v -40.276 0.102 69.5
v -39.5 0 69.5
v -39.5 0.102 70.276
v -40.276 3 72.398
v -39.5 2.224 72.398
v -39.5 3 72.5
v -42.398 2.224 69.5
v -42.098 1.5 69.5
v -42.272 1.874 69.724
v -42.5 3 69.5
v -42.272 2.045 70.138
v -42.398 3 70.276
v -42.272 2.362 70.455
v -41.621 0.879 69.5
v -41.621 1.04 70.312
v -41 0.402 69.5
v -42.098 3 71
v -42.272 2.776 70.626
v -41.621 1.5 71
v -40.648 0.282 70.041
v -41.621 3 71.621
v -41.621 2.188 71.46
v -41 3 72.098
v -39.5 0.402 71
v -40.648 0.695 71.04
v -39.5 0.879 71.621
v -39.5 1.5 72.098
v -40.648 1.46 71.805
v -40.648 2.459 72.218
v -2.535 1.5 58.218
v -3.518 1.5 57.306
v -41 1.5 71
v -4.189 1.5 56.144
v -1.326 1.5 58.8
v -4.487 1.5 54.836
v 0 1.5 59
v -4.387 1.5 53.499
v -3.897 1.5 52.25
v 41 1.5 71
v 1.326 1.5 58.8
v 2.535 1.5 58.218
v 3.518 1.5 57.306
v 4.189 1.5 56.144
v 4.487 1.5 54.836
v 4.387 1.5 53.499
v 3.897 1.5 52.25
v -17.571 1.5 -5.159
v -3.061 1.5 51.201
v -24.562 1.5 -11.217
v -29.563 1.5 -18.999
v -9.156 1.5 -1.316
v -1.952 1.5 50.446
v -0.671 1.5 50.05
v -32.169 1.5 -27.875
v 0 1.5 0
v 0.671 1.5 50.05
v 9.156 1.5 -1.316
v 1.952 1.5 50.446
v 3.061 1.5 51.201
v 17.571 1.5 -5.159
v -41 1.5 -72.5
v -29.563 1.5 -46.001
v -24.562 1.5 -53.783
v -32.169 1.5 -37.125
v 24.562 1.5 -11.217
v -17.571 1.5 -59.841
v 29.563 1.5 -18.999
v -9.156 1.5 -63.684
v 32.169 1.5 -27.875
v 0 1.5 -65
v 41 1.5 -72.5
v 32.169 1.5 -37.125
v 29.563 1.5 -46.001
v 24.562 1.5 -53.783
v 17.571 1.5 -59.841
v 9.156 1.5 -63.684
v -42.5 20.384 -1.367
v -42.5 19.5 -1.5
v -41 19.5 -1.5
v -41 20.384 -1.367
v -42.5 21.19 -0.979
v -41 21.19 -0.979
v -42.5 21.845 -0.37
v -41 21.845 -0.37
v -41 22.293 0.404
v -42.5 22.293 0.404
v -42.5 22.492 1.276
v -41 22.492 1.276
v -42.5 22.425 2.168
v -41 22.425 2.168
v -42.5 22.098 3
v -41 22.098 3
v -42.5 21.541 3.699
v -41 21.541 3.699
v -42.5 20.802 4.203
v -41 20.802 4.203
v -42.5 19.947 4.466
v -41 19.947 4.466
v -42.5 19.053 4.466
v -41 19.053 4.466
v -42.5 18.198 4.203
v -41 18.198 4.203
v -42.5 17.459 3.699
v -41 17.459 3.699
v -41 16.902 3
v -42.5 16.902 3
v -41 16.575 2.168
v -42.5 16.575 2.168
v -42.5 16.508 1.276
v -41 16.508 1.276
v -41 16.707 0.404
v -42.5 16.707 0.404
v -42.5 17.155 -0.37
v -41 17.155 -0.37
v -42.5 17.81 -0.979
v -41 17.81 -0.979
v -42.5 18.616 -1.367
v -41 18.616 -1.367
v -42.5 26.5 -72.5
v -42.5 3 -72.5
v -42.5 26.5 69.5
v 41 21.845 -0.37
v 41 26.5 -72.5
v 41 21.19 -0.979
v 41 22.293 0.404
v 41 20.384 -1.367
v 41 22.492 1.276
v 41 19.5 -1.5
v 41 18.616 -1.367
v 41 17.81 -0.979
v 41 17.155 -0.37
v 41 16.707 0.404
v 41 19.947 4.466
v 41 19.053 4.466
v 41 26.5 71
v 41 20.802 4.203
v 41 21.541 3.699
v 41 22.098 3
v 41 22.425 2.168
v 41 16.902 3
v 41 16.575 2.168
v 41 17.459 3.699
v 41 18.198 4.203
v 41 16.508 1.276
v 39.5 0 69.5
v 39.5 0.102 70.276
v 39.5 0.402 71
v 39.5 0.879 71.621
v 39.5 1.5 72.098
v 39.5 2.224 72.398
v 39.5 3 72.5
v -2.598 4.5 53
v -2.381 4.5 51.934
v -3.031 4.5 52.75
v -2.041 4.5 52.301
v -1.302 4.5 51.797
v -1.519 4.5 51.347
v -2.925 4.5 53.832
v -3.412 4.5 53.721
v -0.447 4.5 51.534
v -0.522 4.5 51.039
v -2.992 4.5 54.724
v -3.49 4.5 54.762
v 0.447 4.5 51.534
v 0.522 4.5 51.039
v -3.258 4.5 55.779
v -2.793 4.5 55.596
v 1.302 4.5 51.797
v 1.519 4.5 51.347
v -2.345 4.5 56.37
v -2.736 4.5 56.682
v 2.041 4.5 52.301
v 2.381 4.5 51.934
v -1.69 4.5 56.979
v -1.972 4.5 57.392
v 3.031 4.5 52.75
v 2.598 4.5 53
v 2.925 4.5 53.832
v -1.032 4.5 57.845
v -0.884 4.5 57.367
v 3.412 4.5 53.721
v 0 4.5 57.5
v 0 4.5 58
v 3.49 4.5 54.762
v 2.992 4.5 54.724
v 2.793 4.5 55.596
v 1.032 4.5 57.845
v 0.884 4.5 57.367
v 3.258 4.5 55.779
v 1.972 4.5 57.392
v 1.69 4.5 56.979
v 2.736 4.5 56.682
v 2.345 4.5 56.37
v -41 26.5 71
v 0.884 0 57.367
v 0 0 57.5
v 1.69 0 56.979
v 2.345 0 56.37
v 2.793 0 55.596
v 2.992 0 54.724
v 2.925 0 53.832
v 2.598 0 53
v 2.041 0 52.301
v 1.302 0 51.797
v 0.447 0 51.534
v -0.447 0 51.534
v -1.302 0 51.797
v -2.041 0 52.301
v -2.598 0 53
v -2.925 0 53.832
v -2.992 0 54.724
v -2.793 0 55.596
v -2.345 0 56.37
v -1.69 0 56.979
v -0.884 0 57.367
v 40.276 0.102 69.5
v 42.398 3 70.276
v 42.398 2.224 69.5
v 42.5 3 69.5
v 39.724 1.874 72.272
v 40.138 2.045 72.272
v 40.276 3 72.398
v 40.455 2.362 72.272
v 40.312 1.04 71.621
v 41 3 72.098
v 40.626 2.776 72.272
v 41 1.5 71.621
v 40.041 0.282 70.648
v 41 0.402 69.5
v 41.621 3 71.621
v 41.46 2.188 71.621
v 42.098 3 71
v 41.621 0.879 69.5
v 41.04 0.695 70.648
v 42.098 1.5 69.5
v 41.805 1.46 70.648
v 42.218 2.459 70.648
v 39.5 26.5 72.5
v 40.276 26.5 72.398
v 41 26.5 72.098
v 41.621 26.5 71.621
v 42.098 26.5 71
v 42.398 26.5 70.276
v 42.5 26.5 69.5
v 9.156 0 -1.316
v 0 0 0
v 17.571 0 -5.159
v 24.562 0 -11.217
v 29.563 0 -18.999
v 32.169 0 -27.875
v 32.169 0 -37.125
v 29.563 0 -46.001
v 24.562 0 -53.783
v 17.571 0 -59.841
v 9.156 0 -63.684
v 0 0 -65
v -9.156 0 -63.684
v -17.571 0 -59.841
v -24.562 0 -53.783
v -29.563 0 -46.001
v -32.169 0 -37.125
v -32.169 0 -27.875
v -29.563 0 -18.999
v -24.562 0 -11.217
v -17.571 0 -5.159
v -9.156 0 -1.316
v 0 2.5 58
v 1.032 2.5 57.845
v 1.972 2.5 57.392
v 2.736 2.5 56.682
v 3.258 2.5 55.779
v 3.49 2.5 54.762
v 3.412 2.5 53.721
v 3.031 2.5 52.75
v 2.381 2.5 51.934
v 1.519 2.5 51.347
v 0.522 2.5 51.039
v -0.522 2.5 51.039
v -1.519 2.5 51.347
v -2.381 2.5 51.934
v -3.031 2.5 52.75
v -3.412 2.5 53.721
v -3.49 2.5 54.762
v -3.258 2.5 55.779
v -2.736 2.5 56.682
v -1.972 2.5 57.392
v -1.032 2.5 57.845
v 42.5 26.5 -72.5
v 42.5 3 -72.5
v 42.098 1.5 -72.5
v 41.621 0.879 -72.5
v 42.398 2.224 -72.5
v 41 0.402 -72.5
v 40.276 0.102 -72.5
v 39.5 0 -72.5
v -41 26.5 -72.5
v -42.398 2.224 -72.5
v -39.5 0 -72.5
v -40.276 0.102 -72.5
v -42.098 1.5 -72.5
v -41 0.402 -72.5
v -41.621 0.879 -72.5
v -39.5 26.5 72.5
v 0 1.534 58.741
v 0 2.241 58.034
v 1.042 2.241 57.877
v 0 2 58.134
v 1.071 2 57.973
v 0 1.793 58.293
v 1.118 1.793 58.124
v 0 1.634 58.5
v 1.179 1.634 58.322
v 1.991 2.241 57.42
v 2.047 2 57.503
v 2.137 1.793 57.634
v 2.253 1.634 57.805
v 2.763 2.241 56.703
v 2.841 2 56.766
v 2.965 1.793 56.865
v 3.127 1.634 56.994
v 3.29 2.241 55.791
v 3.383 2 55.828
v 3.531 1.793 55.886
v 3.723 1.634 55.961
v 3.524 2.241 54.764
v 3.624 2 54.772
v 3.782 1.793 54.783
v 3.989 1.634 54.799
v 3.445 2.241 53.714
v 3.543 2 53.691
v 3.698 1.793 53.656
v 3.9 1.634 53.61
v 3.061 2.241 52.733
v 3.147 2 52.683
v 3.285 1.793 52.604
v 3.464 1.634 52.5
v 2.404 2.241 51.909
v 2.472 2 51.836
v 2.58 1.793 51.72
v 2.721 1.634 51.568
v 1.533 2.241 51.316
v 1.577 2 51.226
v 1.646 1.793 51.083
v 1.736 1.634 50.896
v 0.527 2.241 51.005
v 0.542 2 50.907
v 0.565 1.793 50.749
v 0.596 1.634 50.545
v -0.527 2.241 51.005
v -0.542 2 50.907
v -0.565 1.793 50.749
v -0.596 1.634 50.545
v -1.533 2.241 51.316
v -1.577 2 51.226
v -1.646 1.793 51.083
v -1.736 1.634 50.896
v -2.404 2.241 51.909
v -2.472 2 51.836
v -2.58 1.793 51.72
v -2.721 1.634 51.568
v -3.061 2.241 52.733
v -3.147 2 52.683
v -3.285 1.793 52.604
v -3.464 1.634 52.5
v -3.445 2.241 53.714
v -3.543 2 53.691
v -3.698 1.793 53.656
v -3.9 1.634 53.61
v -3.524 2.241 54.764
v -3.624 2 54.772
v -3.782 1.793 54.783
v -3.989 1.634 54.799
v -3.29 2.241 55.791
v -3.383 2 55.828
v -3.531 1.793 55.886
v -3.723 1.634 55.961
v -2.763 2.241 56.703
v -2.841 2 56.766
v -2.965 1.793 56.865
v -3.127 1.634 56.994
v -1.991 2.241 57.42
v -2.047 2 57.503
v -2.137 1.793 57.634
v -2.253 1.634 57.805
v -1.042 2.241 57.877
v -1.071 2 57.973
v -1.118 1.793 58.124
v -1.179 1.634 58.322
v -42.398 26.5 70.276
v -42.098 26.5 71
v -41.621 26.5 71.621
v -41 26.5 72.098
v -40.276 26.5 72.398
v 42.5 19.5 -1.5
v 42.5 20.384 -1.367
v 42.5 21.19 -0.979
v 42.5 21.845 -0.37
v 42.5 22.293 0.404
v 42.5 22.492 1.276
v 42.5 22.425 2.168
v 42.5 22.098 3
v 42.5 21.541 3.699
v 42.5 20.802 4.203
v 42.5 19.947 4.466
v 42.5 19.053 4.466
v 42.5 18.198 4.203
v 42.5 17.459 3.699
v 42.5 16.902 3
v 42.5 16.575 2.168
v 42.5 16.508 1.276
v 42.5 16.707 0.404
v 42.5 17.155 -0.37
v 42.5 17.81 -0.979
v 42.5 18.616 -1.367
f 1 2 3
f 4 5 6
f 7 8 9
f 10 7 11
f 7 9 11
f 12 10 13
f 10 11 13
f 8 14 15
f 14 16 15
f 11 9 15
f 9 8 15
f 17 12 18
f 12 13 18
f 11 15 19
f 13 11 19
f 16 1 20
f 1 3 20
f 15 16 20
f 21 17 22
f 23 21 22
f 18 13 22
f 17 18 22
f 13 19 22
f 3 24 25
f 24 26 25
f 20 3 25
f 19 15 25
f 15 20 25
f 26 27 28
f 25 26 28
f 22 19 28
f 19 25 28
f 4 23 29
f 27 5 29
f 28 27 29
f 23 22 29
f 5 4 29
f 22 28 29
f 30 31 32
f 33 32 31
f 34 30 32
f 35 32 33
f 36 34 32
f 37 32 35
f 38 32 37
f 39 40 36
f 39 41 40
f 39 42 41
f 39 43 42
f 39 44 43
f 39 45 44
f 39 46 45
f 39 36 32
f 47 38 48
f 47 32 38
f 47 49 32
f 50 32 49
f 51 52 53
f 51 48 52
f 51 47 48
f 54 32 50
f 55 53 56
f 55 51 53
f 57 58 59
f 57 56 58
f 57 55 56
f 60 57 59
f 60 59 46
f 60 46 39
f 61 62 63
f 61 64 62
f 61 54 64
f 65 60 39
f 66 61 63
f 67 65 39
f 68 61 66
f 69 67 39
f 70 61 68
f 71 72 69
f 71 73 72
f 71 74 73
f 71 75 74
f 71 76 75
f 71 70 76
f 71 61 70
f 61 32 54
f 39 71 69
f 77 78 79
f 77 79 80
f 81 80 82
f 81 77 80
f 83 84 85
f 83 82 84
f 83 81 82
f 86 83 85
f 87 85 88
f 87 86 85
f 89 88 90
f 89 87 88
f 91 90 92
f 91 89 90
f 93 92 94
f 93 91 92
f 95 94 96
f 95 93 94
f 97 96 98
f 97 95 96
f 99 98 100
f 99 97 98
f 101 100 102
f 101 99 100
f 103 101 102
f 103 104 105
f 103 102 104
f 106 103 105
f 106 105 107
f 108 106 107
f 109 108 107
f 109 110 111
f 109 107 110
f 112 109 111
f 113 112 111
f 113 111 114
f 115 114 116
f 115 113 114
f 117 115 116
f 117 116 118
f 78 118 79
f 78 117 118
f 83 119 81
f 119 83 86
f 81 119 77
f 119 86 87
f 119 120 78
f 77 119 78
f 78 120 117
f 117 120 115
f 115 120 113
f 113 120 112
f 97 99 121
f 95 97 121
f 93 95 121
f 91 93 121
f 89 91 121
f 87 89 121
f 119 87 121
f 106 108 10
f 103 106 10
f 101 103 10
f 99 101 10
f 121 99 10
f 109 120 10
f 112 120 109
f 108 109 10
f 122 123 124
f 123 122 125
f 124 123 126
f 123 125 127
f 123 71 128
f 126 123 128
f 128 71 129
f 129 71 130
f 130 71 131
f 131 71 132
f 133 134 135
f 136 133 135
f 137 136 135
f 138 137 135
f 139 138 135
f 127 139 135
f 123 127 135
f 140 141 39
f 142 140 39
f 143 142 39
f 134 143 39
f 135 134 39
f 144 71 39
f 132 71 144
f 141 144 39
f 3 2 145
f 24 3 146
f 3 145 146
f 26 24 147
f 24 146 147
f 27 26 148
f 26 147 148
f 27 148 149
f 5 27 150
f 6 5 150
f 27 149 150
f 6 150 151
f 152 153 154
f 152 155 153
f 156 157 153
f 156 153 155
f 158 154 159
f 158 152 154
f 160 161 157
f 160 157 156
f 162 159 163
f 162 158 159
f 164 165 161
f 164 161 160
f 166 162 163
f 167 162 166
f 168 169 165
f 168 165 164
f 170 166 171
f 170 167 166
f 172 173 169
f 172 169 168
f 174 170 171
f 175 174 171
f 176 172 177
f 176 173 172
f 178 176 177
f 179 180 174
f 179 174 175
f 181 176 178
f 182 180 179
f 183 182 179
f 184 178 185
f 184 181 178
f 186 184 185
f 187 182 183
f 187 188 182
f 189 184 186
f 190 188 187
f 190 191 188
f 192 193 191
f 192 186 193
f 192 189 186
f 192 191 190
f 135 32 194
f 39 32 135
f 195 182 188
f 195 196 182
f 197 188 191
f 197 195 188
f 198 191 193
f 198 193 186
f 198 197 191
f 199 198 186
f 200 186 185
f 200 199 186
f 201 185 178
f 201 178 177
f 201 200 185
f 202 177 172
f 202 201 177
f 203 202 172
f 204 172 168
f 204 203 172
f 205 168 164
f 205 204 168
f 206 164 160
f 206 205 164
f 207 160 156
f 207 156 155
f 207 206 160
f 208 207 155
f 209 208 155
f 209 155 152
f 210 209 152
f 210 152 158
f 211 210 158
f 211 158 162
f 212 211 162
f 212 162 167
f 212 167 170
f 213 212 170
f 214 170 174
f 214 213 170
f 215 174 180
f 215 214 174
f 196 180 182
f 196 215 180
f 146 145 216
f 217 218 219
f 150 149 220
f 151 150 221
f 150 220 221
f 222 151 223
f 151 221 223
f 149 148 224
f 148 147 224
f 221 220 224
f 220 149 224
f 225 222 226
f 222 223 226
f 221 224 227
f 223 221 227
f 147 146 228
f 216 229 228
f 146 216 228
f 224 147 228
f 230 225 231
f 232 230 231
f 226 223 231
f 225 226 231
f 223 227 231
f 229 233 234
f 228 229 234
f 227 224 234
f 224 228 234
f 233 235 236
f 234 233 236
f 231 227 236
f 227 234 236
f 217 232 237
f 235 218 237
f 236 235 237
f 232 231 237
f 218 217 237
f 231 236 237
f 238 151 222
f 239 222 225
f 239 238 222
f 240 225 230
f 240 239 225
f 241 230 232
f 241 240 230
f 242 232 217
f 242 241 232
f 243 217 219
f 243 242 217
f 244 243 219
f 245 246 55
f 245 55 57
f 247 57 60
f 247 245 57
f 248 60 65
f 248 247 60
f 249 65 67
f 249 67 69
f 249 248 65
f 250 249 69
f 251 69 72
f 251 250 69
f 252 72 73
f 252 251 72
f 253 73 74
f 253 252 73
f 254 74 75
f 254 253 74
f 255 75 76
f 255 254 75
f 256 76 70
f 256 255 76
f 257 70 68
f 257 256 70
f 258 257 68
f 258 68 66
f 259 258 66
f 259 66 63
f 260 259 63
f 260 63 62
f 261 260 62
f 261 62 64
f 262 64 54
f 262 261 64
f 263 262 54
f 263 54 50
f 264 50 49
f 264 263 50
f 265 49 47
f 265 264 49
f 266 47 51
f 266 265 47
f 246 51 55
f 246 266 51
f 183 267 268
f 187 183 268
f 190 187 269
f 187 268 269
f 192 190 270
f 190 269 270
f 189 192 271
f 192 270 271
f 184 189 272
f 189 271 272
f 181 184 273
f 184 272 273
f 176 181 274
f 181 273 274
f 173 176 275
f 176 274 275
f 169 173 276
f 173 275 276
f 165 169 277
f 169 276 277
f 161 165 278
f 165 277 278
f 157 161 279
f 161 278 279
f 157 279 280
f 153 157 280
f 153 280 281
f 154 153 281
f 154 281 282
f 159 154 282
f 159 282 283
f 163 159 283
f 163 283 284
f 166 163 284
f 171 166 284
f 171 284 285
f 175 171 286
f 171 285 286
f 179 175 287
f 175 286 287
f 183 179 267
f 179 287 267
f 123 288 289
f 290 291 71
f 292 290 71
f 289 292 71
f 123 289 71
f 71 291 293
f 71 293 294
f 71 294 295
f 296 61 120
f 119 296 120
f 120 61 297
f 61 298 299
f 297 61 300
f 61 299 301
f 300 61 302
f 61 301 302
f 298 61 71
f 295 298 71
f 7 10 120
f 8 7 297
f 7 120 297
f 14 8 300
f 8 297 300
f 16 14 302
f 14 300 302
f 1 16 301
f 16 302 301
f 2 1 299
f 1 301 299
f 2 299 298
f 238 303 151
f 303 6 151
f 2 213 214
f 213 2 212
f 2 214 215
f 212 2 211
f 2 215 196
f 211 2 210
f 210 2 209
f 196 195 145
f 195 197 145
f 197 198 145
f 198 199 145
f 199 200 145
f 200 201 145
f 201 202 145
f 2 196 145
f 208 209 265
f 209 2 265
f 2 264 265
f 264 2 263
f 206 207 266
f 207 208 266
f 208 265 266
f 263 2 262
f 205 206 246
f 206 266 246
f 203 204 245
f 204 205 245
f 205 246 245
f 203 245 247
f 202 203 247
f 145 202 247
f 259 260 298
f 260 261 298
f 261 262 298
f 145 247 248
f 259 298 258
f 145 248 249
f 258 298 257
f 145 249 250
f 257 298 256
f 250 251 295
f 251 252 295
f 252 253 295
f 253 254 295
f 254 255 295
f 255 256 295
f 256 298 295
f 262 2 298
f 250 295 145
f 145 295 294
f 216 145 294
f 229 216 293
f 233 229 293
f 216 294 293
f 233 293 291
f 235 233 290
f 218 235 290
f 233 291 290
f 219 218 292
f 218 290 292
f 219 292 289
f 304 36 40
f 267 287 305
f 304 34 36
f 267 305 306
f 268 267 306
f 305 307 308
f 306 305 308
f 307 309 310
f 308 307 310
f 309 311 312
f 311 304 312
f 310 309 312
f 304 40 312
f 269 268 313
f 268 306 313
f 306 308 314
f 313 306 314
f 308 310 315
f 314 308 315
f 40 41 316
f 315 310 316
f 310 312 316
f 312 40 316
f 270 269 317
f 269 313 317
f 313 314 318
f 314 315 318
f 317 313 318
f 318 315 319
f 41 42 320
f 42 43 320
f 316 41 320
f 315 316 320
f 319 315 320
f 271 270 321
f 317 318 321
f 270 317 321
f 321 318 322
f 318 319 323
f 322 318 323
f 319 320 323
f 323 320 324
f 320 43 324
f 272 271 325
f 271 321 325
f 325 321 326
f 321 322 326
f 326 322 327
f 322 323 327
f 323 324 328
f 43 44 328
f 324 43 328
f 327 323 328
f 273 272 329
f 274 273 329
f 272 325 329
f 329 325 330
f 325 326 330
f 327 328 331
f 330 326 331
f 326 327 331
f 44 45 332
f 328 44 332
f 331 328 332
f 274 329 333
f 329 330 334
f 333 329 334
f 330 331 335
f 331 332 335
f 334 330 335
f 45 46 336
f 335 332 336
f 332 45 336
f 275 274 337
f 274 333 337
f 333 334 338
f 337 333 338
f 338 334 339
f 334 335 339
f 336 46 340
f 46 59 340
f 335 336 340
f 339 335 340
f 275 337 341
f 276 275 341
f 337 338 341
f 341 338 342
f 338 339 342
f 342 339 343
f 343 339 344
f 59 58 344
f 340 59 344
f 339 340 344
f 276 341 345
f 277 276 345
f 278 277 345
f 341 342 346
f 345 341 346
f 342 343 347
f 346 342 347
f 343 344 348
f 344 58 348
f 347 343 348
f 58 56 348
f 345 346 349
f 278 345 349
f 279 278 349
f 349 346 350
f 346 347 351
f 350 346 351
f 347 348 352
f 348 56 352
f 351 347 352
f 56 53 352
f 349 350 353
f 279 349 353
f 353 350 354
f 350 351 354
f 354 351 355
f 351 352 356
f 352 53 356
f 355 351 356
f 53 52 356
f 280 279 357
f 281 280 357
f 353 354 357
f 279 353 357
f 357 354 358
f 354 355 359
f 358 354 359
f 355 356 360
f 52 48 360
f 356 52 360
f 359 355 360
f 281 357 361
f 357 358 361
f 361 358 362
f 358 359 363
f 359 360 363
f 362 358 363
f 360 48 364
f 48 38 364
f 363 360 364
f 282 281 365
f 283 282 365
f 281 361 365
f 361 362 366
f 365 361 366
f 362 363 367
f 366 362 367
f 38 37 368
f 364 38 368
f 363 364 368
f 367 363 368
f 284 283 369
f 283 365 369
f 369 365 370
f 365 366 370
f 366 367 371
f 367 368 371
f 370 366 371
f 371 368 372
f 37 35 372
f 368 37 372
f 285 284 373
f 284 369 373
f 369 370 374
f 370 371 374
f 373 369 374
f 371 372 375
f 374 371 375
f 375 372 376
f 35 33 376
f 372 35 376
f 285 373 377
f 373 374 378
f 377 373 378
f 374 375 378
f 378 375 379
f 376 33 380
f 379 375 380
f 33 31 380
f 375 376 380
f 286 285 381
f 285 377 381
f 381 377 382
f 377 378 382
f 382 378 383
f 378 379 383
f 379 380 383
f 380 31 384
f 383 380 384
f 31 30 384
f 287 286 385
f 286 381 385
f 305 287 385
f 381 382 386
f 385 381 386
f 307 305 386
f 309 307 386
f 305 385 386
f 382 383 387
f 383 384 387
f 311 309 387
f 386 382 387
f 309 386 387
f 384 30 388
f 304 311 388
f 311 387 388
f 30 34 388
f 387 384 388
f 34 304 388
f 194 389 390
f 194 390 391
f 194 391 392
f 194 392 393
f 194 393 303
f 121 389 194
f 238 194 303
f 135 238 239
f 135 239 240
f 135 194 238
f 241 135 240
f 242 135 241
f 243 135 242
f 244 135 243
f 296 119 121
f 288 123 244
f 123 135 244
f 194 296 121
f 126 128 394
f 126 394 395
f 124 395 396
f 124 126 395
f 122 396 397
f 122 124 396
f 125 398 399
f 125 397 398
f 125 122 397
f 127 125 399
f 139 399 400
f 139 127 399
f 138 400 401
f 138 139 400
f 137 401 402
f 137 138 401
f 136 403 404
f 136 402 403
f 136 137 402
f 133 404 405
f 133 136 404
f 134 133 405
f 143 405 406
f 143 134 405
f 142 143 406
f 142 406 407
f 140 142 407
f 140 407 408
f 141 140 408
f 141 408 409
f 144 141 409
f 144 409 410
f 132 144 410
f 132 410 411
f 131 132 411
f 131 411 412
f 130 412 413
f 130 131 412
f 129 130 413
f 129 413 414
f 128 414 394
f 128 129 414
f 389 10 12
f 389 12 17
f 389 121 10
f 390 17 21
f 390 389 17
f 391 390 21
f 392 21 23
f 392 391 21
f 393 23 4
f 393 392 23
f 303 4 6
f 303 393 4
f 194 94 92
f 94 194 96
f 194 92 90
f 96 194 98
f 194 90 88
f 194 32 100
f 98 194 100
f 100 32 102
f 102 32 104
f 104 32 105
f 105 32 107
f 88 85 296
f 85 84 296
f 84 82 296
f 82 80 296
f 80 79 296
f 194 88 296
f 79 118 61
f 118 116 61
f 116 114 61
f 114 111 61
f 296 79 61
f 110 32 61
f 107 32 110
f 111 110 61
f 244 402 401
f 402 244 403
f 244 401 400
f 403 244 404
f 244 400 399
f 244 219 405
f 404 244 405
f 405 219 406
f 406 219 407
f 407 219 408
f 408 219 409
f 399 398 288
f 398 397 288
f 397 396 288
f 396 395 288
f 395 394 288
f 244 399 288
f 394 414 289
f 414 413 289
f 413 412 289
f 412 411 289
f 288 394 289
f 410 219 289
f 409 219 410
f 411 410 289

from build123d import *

# Parameters (mm, degrees)
SKETCH1_W               = 85
SKETCH1_H               = 145
SKETCH1_R               = 32.5
SKETCH1_R_2             = 3
BOSS_EXTRUDE1_DEPTH     = 1.5
SKETCH2_W               = 82
SKETCH2_H               = 1.5
BOSS_EXTRUDE2_DEPTH     = 25
CUT_EXTRUDE1_DEPTH      = 89.117818856
CUT_EXTRUDE1_DEPTH_BACK = 89.117818856
SKETCH3_R               = 3
FILLET1_R               = 3
SKETCH4_R               = 3.5
SKETCH4_R_2             = 3
BOSS_EXTRUDE3_DEPTH     = 3
FILLET2_R               = 1


with BuildPart() as part:
    # Sketch1 → Boss-Extrude1 (new body)
    with BuildSketch(Plane(origin=(0, 0, 0), x_dir=(1, 0, 0), z_dir=(0, 1, 0))):
        Rectangle(SKETCH1_W, SKETCH1_H)
        with Locations(Location((0, 32.5, 0), (0, 0, 270))):
            Circle(SKETCH1_R, mode=Mode.SUBTRACT)
        with Locations(Location((0, -54.5, 0), (0, 0, 270))):
            Circle(SKETCH1_R_2, mode=Mode.SUBTRACT)
    extrude(amount=BOSS_EXTRUDE1_DEPTH)

    # Sketch2 → Boss-Extrude2 (add)
    with BuildSketch(Plane(origin=(0, 1.5, 0), x_dir=(1, 0, 0), z_dir=(0, 1, 0))):
        Polygon((-42.5, 72.5), (-42.5, -72.5), (-41, -72.5), (-41, -71), (-41, 72.5), align=None)
        with Locations((0, -71.75)):
            Rectangle(SKETCH2_W, SKETCH2_H)
        Polygon((41, -71), (41, -72.5), (42.5, -72.5), (42.5, 72.5), (41, 72.5), align=None)
    extrude(amount=BOSS_EXTRUDE2_DEPTH)

    # Sketch3 → Cut-Extrude1 (cut, two sides: drawn at the far end of the back side and taken through both)
    with BuildSketch(Plane(origin=(0, 0, 0), x_dir=(0, 0, -1), z_dir=(1, 0, 0)).offset(-CUT_EXTRUDE1_DEPTH_BACK)):
        with Locations((-1.5, 19.5)):
            Circle(SKETCH3_R)
    extrude(amount=CUT_EXTRUDE1_DEPTH + CUT_EXTRUDE1_DEPTH_BACK, mode=Mode.SUBTRACT)

    # Fillet1
    fillet1_edges = [part.edges().sort_by_distance(p)[0] for p in [
        (42.5, 0, 0),
        (0, 0, 72.5),
        (-42.5, 0, 0),
        (42.5, 13.25, 72.5),
        (-42.5, 13.25, 72.5),
    ]]
    fillet(fillet1_edges, radius=FILLET1_R)

    # Sketch4 → Boss-Extrude3 (add)
    with BuildSketch(Plane(origin=(0, 1.5, 0), x_dir=(1, 0, 0), z_dir=(0, 1, 0))):
        with Locations(Location((0, -54.5, 0), (0, 0, 270))):
            Circle(SKETCH4_R)
        with Locations(Location((0, -54.5, 0), (0, 0, 270))):
            Circle(SKETCH4_R_2, mode=Mode.SUBTRACT)
    extrude(amount=BOSS_EXTRUDE3_DEPTH)

    # Fillet2
    fillet2_edges = [part.edges().sort_by_distance(p)[0] for p in [
        (0, 1.5, 51),
    ]]
    fillet(fillet2_edges, radius=FILLET2_R)


solid = part.part
